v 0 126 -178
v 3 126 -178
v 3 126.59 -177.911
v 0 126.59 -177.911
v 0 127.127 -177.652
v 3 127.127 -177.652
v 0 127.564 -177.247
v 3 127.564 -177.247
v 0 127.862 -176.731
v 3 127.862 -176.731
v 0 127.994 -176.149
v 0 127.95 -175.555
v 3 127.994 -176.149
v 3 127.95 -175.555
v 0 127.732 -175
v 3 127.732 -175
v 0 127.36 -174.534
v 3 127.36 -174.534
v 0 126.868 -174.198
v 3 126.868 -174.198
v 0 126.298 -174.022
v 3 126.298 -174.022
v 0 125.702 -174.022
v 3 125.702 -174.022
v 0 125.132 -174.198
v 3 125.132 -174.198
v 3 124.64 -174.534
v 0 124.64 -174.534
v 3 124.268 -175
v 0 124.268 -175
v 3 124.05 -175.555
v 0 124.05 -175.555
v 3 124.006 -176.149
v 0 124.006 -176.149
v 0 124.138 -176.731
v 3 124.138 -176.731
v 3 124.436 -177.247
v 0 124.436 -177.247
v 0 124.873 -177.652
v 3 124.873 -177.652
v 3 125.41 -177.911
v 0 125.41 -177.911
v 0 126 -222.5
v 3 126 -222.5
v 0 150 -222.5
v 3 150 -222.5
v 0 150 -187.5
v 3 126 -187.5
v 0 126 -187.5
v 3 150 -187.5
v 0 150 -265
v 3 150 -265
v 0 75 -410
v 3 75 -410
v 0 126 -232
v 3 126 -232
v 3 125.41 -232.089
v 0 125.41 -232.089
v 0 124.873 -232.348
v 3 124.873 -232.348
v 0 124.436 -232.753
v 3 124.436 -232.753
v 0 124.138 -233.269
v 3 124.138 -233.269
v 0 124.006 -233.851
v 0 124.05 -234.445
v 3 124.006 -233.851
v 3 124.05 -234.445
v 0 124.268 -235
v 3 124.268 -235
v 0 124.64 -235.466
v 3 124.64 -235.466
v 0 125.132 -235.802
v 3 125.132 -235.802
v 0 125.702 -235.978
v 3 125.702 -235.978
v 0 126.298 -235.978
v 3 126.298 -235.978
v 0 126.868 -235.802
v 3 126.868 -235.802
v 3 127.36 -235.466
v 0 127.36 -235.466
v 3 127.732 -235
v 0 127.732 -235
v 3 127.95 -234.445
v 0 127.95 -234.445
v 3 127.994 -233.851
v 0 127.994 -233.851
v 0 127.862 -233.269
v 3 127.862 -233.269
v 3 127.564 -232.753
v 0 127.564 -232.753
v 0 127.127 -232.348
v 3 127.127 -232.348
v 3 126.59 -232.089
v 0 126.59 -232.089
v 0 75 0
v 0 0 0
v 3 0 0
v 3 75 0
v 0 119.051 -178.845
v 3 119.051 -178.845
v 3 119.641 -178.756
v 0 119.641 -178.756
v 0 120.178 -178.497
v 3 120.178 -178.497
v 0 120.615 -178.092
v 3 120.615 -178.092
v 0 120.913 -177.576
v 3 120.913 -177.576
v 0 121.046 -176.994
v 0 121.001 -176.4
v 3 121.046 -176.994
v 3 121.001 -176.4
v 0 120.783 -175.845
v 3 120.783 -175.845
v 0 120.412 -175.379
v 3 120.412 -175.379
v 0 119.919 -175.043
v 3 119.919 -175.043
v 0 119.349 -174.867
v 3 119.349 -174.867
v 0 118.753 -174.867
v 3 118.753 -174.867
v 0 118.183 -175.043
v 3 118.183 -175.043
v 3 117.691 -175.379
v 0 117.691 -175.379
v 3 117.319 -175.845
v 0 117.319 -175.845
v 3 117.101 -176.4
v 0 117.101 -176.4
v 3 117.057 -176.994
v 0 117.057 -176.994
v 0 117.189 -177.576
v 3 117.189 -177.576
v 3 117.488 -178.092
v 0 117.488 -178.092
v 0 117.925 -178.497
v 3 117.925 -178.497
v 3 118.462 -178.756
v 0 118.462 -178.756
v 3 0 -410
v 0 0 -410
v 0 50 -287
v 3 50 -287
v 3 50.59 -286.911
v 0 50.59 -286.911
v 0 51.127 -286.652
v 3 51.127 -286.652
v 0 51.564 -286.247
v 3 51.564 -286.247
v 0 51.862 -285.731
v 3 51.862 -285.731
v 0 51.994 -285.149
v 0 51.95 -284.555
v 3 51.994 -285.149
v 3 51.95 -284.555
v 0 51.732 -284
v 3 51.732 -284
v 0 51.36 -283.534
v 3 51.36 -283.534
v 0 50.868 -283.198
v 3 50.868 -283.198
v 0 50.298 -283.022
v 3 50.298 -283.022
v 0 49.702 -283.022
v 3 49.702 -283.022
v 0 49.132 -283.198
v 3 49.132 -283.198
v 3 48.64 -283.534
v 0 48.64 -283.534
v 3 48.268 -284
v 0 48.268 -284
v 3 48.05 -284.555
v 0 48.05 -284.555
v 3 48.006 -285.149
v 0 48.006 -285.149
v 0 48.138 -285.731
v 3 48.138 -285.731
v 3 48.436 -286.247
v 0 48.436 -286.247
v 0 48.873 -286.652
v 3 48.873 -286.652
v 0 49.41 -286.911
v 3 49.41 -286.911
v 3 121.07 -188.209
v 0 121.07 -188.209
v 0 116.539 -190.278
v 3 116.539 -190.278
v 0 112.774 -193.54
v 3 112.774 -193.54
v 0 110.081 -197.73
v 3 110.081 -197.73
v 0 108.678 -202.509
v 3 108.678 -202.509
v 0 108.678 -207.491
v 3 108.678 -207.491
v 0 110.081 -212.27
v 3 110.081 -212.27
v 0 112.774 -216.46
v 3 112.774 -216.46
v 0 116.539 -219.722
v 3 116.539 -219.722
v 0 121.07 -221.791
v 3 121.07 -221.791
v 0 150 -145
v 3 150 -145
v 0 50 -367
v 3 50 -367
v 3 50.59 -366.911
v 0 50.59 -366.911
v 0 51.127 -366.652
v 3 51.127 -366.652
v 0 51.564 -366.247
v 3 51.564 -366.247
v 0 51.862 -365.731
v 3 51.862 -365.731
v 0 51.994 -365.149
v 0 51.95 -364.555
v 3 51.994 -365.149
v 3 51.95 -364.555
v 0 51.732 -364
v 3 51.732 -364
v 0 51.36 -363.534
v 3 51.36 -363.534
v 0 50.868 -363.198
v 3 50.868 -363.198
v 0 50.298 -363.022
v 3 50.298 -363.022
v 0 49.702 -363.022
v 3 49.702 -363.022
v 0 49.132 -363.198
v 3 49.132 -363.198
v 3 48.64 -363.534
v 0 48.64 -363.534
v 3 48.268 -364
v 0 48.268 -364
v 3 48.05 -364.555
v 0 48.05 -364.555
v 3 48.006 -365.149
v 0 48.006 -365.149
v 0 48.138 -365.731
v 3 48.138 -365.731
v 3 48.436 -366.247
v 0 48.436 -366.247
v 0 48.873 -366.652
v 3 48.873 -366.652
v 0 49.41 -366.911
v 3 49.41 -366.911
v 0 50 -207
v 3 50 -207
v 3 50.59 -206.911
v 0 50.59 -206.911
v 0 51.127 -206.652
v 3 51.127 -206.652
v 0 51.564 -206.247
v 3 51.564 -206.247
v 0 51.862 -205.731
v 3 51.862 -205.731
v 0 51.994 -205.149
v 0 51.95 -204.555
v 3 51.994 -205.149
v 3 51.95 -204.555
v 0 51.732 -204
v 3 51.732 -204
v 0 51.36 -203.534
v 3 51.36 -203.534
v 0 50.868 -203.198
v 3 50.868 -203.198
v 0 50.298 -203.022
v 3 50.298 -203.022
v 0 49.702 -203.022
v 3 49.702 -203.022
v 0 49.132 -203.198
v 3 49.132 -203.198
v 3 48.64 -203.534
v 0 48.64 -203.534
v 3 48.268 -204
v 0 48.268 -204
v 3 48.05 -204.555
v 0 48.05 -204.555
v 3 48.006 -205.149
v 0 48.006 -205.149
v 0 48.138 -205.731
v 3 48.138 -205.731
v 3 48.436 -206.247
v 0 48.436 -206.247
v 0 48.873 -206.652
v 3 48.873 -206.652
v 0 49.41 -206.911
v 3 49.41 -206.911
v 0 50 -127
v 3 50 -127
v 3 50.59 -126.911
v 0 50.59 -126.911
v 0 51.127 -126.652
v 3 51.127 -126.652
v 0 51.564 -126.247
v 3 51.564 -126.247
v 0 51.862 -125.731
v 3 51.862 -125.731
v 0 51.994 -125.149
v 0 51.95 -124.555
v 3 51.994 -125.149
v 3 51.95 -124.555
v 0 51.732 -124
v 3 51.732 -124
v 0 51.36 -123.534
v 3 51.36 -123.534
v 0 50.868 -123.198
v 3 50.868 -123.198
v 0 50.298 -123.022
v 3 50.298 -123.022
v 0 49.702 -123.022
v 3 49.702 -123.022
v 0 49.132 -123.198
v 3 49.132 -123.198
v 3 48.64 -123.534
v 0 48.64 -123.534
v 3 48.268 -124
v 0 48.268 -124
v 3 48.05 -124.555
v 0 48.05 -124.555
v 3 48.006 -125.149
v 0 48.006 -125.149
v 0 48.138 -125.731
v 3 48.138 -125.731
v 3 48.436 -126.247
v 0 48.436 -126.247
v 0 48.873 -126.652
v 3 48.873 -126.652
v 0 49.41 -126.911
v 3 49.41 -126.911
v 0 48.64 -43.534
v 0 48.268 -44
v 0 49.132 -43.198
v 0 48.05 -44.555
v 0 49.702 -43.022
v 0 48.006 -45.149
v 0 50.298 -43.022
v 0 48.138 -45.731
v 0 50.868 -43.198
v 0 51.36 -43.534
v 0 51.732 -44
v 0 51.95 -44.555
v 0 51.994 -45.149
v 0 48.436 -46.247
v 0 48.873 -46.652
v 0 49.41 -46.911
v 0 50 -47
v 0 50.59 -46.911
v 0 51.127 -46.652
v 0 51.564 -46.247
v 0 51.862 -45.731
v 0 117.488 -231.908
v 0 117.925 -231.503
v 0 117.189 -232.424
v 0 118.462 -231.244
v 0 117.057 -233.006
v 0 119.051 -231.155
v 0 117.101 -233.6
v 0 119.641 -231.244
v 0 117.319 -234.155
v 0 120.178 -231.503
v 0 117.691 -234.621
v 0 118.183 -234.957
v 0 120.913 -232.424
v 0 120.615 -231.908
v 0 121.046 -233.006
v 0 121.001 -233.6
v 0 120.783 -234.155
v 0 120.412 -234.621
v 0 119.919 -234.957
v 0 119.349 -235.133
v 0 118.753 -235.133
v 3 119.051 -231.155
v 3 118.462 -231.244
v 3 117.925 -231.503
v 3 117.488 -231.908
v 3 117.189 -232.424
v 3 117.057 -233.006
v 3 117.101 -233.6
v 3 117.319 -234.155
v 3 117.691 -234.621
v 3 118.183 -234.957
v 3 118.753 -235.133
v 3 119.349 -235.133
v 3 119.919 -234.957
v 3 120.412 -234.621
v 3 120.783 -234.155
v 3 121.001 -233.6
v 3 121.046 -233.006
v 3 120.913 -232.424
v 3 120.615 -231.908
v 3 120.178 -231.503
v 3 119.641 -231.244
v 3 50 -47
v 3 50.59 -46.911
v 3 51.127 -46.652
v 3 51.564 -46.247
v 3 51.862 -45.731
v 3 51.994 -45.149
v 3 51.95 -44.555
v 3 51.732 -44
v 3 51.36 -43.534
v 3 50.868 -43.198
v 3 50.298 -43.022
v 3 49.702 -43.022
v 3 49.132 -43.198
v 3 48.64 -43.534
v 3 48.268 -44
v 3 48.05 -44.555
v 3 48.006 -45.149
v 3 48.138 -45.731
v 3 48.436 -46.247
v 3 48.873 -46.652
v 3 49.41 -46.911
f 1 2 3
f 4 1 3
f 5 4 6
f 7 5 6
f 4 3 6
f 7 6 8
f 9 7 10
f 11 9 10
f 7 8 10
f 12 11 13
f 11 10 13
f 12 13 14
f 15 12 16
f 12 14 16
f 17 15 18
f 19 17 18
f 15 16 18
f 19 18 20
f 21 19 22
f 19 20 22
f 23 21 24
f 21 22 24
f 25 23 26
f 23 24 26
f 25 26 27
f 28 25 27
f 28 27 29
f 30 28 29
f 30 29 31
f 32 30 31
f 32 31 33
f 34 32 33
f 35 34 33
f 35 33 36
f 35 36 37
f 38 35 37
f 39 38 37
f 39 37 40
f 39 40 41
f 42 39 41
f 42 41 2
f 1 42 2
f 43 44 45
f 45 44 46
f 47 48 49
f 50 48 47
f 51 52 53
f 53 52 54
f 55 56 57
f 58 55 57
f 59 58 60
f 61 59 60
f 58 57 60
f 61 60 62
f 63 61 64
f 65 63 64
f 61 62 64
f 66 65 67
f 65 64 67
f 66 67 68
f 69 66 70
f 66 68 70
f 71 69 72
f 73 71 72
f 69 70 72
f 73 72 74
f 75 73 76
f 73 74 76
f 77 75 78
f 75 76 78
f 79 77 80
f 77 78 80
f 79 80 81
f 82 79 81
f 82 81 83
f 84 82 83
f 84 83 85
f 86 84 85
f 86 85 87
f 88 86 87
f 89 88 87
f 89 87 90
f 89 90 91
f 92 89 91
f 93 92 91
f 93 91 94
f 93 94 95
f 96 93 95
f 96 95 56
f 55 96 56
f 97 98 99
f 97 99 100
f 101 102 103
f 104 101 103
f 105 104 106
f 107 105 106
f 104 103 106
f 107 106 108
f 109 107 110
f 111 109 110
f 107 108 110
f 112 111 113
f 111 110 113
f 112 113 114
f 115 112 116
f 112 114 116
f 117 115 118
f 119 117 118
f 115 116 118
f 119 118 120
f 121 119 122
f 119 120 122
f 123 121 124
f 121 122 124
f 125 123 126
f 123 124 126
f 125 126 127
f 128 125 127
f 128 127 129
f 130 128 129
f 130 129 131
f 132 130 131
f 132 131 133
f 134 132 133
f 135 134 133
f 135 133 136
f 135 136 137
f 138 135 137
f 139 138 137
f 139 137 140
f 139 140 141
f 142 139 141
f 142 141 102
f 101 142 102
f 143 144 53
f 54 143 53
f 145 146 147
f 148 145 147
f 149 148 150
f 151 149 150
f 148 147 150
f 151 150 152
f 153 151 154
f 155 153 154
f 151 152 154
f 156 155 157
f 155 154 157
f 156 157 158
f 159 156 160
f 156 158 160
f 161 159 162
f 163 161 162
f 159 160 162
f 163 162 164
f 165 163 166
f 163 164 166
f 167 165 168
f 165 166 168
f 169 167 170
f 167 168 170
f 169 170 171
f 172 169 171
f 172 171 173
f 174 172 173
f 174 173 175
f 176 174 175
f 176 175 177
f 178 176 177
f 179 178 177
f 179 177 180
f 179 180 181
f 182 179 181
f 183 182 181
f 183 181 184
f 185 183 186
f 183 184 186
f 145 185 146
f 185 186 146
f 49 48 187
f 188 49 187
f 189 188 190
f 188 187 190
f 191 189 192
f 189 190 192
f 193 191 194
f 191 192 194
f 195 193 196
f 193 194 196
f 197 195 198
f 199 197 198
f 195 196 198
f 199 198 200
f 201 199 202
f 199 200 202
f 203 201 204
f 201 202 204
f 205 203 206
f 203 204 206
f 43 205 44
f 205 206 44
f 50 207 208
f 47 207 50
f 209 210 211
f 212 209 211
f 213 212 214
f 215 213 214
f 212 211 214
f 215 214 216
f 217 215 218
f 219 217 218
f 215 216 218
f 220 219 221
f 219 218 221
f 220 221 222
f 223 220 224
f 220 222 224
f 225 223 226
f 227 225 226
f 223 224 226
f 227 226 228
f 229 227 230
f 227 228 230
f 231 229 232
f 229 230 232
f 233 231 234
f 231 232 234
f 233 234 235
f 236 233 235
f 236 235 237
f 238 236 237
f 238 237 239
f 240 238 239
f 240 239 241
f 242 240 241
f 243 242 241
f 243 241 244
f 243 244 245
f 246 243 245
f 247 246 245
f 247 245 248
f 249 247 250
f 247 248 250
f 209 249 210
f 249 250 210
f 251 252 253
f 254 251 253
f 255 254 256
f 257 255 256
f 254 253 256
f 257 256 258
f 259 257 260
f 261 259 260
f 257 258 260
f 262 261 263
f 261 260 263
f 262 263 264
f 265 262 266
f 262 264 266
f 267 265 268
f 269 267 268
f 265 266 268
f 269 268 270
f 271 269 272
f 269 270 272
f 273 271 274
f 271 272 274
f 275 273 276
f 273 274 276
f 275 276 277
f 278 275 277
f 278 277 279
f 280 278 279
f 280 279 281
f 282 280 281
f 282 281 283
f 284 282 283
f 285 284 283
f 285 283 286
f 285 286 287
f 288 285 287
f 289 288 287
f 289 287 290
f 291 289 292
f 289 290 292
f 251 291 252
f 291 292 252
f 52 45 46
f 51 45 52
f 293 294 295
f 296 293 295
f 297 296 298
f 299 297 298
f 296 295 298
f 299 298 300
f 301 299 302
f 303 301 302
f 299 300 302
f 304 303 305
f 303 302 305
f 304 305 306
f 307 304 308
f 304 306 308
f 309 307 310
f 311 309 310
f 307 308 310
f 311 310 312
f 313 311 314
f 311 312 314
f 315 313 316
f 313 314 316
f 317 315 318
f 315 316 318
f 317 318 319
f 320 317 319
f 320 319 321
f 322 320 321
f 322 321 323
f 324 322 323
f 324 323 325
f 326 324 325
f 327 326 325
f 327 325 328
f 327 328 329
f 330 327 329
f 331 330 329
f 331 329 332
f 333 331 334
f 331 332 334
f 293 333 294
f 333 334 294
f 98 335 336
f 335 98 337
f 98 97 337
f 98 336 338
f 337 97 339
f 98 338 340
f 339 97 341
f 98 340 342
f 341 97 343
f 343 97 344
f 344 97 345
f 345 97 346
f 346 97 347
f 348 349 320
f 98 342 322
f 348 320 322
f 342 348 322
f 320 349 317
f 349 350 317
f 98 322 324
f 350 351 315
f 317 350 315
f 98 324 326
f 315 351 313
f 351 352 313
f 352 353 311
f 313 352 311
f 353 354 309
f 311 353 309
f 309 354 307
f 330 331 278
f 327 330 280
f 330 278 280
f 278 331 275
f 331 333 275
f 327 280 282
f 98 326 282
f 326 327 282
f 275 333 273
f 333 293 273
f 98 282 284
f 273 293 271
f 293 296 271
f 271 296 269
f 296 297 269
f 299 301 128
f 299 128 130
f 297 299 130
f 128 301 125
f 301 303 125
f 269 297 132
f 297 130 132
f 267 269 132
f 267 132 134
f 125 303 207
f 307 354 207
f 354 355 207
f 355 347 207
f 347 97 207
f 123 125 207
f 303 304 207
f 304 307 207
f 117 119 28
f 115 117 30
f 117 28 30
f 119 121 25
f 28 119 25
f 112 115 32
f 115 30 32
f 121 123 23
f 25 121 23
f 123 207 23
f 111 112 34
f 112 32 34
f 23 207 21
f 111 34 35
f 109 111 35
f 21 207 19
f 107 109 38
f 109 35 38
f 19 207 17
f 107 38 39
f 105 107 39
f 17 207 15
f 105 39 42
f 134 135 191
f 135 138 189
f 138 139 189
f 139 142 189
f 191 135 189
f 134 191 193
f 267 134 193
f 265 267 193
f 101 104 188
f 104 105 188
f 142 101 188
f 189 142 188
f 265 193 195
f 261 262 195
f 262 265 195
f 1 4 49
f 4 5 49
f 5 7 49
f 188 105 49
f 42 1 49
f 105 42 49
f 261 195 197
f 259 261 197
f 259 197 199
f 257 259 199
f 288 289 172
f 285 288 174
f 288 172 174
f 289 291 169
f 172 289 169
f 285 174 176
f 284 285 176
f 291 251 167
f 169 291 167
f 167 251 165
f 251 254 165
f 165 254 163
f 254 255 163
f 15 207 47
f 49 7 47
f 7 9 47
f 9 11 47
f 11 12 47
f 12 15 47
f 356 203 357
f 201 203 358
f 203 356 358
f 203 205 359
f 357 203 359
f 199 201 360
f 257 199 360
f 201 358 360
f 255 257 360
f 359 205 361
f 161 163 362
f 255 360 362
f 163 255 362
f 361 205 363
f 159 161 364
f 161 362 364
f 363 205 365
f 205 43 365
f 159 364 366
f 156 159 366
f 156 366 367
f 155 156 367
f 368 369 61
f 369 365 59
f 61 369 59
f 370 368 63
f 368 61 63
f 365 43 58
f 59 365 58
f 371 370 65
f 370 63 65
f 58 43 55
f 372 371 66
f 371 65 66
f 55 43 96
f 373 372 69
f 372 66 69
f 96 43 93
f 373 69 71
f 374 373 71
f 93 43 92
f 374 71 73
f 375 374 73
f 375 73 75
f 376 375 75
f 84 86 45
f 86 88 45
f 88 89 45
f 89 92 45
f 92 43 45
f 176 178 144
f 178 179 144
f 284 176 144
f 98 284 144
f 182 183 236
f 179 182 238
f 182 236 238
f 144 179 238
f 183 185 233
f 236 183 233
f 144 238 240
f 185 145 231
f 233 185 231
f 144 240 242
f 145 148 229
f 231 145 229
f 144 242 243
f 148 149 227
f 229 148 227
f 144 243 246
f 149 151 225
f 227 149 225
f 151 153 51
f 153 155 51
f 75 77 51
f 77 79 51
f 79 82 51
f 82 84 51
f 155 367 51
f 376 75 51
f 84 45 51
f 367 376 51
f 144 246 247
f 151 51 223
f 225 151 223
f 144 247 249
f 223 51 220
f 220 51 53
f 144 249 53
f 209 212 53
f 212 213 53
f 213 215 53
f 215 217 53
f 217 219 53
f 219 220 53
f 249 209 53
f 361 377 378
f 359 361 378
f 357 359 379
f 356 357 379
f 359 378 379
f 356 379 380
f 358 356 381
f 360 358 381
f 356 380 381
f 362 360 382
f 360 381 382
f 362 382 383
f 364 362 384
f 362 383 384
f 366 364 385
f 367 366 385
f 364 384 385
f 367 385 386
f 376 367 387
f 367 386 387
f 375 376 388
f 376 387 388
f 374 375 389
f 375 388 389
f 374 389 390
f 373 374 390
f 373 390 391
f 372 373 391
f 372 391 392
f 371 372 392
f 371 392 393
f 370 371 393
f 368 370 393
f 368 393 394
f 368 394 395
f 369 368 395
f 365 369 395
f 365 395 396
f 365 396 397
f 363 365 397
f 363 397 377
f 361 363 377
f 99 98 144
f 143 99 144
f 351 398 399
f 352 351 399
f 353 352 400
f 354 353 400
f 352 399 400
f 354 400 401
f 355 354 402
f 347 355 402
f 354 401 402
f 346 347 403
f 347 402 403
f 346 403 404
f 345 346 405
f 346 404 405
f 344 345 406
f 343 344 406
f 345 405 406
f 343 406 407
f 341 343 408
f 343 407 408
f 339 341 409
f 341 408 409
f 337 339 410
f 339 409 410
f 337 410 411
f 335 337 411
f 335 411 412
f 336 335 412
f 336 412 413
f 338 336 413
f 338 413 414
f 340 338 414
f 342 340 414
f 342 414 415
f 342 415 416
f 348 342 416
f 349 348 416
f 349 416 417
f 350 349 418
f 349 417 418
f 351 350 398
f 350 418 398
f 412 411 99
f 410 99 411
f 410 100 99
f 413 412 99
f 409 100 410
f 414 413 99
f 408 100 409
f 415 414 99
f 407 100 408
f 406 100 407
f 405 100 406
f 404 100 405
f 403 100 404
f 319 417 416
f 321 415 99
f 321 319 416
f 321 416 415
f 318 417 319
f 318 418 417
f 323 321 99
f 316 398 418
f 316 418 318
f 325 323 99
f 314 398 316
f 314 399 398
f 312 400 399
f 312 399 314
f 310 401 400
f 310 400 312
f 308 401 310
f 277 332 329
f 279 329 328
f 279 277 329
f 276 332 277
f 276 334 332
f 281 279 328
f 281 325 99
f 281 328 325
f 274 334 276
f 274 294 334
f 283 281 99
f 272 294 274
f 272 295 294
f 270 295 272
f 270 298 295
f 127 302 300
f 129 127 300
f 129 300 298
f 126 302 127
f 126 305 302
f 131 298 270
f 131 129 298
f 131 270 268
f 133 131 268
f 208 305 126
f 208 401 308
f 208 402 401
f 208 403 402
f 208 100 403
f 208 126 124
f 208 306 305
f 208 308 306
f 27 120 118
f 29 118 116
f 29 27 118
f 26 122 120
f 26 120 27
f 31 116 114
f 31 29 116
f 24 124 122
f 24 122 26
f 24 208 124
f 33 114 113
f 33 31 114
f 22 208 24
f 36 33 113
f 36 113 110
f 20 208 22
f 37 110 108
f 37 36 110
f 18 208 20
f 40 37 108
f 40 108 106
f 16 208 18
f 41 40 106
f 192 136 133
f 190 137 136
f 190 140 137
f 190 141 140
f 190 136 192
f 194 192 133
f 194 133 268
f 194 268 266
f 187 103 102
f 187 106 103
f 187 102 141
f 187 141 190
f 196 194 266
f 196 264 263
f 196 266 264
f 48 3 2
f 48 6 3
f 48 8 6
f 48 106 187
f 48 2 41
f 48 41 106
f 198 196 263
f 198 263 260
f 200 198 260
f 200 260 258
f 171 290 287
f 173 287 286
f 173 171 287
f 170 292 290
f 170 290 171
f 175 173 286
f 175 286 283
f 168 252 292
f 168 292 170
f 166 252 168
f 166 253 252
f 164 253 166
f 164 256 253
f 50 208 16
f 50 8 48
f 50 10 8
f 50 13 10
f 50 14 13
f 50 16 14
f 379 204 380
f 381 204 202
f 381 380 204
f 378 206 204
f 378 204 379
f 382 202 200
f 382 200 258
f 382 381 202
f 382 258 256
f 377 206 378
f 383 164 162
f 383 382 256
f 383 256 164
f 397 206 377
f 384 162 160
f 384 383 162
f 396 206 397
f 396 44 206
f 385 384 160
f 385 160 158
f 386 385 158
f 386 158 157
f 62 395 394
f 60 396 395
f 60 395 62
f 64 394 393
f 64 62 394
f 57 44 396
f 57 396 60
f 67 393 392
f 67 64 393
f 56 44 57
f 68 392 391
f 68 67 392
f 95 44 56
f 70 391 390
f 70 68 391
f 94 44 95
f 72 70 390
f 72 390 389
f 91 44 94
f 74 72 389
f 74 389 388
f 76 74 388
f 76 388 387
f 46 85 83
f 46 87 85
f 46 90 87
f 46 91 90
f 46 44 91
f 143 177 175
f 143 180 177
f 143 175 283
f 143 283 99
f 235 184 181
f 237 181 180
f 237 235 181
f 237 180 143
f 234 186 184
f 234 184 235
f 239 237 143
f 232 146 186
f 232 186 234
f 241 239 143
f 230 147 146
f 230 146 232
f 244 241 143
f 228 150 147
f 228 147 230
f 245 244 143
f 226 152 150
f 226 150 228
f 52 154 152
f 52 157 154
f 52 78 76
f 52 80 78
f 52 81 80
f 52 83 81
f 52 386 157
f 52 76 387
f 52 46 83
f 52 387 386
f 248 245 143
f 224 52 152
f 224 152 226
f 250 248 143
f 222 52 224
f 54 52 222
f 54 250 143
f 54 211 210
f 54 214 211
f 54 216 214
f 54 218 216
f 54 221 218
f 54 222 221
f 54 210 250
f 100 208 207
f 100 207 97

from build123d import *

# Parameters (mm, degrees)
SKETCH1_W           = 410
SKETCH1_H           = 150
BOSS_EXTRUDE1_DEPTH = 3
CUT_EXTRUDE1_DEPTH  = 3
SKETCH3_R           = 2
CUT_EXTRUDE2_DEPTH  = 3
SKETCH4_R           = 2
SKETCH4_R_2         = 17.5
CUT_EXTRUDE3_DEPTH  = 10
SKETCH5_W           = 35
SKETCH5_H           = 24
CUT_EXTRUDE4_DEPTH  = 10


with BuildPart() as part:
    # Sketch1 → Boss-Extrude1 (new body)
    with BuildSketch(Plane(origin=(0, 0, 0), x_dir=(0, 0, -1), z_dir=(1, 0, 0))):
        with Locations((205, 75)):
            Rectangle(SKETCH1_W, SKETCH1_H)
    extrude(amount=BOSS_EXTRUDE1_DEPTH)

    # Sketch2 → Cut-Extrude1 (cut)
    with BuildSketch(Plane(origin=(3, 0, 0), x_dir=(0, 0, -1), z_dir=(1, 0, 0))):
        Polygon((145, 150), (0, 75), (0, 150), align=None)
        Polygon((265, 150), (410, 75), (410, 150), align=None)
    extrude(amount=-CUT_EXTRUDE1_DEPTH, mode=Mode.SUBTRACT)

    # Sketch3 → Cut-Extrude2 (cut)
    with BuildSketch(Plane(origin=(3, 0, 0), x_dir=(0, 0, -1), z_dir=(1, 0, 0))):
        with Locations((45, 50)):
            Circle(SKETCH3_R)
        with Locations((125, 50)):
            Circle(SKETCH3_R)
        with Locations((205, 50)):
            Circle(SKETCH3_R)
        with Locations((285, 50)):
            Circle(SKETCH3_R)
        with Locations((365, 50)):
            Circle(SKETCH3_R)
    extrude(amount=-CUT_EXTRUDE2_DEPTH, mode=Mode.SUBTRACT)

    # Sketch4 → Cut-Extrude3 (cut)
    with BuildSketch(Plane(origin=(3, 0, 0), x_dir=(0, 0, -1), z_dir=(1, 0, 0))):
        with Locations((176, 126)):
            Circle(SKETCH4_R)
        with Locations((176.845, 119.051188951)):
            Circle(SKETCH4_R)
        with Locations((205, 126)):
            Circle(SKETCH4_R_2)
        with Locations(Location((233.155, 119.051188951, 0), (0, 0, 180))):
            Circle(SKETCH4_R)
        with Locations(Location((234, 126, 0), (0, 0, 180))):
            Circle(SKETCH4_R)
    extrude(amount=-CUT_EXTRUDE3_DEPTH, mode=Mode.SUBTRACT)

    # Sketch5 → Cut-Extrude4 (cut)
    with BuildSketch(Plane(origin=(3, 0, 0), x_dir=(0, 0, -1), z_dir=(1, 0, 0))):
        with Locations((205, 138)):
            Rectangle(SKETCH5_W, SKETCH5_H)
    extrude(amount=-CUT_EXTRUDE4_DEPTH, mode=Mode.SUBTRACT)


solid = part.part
